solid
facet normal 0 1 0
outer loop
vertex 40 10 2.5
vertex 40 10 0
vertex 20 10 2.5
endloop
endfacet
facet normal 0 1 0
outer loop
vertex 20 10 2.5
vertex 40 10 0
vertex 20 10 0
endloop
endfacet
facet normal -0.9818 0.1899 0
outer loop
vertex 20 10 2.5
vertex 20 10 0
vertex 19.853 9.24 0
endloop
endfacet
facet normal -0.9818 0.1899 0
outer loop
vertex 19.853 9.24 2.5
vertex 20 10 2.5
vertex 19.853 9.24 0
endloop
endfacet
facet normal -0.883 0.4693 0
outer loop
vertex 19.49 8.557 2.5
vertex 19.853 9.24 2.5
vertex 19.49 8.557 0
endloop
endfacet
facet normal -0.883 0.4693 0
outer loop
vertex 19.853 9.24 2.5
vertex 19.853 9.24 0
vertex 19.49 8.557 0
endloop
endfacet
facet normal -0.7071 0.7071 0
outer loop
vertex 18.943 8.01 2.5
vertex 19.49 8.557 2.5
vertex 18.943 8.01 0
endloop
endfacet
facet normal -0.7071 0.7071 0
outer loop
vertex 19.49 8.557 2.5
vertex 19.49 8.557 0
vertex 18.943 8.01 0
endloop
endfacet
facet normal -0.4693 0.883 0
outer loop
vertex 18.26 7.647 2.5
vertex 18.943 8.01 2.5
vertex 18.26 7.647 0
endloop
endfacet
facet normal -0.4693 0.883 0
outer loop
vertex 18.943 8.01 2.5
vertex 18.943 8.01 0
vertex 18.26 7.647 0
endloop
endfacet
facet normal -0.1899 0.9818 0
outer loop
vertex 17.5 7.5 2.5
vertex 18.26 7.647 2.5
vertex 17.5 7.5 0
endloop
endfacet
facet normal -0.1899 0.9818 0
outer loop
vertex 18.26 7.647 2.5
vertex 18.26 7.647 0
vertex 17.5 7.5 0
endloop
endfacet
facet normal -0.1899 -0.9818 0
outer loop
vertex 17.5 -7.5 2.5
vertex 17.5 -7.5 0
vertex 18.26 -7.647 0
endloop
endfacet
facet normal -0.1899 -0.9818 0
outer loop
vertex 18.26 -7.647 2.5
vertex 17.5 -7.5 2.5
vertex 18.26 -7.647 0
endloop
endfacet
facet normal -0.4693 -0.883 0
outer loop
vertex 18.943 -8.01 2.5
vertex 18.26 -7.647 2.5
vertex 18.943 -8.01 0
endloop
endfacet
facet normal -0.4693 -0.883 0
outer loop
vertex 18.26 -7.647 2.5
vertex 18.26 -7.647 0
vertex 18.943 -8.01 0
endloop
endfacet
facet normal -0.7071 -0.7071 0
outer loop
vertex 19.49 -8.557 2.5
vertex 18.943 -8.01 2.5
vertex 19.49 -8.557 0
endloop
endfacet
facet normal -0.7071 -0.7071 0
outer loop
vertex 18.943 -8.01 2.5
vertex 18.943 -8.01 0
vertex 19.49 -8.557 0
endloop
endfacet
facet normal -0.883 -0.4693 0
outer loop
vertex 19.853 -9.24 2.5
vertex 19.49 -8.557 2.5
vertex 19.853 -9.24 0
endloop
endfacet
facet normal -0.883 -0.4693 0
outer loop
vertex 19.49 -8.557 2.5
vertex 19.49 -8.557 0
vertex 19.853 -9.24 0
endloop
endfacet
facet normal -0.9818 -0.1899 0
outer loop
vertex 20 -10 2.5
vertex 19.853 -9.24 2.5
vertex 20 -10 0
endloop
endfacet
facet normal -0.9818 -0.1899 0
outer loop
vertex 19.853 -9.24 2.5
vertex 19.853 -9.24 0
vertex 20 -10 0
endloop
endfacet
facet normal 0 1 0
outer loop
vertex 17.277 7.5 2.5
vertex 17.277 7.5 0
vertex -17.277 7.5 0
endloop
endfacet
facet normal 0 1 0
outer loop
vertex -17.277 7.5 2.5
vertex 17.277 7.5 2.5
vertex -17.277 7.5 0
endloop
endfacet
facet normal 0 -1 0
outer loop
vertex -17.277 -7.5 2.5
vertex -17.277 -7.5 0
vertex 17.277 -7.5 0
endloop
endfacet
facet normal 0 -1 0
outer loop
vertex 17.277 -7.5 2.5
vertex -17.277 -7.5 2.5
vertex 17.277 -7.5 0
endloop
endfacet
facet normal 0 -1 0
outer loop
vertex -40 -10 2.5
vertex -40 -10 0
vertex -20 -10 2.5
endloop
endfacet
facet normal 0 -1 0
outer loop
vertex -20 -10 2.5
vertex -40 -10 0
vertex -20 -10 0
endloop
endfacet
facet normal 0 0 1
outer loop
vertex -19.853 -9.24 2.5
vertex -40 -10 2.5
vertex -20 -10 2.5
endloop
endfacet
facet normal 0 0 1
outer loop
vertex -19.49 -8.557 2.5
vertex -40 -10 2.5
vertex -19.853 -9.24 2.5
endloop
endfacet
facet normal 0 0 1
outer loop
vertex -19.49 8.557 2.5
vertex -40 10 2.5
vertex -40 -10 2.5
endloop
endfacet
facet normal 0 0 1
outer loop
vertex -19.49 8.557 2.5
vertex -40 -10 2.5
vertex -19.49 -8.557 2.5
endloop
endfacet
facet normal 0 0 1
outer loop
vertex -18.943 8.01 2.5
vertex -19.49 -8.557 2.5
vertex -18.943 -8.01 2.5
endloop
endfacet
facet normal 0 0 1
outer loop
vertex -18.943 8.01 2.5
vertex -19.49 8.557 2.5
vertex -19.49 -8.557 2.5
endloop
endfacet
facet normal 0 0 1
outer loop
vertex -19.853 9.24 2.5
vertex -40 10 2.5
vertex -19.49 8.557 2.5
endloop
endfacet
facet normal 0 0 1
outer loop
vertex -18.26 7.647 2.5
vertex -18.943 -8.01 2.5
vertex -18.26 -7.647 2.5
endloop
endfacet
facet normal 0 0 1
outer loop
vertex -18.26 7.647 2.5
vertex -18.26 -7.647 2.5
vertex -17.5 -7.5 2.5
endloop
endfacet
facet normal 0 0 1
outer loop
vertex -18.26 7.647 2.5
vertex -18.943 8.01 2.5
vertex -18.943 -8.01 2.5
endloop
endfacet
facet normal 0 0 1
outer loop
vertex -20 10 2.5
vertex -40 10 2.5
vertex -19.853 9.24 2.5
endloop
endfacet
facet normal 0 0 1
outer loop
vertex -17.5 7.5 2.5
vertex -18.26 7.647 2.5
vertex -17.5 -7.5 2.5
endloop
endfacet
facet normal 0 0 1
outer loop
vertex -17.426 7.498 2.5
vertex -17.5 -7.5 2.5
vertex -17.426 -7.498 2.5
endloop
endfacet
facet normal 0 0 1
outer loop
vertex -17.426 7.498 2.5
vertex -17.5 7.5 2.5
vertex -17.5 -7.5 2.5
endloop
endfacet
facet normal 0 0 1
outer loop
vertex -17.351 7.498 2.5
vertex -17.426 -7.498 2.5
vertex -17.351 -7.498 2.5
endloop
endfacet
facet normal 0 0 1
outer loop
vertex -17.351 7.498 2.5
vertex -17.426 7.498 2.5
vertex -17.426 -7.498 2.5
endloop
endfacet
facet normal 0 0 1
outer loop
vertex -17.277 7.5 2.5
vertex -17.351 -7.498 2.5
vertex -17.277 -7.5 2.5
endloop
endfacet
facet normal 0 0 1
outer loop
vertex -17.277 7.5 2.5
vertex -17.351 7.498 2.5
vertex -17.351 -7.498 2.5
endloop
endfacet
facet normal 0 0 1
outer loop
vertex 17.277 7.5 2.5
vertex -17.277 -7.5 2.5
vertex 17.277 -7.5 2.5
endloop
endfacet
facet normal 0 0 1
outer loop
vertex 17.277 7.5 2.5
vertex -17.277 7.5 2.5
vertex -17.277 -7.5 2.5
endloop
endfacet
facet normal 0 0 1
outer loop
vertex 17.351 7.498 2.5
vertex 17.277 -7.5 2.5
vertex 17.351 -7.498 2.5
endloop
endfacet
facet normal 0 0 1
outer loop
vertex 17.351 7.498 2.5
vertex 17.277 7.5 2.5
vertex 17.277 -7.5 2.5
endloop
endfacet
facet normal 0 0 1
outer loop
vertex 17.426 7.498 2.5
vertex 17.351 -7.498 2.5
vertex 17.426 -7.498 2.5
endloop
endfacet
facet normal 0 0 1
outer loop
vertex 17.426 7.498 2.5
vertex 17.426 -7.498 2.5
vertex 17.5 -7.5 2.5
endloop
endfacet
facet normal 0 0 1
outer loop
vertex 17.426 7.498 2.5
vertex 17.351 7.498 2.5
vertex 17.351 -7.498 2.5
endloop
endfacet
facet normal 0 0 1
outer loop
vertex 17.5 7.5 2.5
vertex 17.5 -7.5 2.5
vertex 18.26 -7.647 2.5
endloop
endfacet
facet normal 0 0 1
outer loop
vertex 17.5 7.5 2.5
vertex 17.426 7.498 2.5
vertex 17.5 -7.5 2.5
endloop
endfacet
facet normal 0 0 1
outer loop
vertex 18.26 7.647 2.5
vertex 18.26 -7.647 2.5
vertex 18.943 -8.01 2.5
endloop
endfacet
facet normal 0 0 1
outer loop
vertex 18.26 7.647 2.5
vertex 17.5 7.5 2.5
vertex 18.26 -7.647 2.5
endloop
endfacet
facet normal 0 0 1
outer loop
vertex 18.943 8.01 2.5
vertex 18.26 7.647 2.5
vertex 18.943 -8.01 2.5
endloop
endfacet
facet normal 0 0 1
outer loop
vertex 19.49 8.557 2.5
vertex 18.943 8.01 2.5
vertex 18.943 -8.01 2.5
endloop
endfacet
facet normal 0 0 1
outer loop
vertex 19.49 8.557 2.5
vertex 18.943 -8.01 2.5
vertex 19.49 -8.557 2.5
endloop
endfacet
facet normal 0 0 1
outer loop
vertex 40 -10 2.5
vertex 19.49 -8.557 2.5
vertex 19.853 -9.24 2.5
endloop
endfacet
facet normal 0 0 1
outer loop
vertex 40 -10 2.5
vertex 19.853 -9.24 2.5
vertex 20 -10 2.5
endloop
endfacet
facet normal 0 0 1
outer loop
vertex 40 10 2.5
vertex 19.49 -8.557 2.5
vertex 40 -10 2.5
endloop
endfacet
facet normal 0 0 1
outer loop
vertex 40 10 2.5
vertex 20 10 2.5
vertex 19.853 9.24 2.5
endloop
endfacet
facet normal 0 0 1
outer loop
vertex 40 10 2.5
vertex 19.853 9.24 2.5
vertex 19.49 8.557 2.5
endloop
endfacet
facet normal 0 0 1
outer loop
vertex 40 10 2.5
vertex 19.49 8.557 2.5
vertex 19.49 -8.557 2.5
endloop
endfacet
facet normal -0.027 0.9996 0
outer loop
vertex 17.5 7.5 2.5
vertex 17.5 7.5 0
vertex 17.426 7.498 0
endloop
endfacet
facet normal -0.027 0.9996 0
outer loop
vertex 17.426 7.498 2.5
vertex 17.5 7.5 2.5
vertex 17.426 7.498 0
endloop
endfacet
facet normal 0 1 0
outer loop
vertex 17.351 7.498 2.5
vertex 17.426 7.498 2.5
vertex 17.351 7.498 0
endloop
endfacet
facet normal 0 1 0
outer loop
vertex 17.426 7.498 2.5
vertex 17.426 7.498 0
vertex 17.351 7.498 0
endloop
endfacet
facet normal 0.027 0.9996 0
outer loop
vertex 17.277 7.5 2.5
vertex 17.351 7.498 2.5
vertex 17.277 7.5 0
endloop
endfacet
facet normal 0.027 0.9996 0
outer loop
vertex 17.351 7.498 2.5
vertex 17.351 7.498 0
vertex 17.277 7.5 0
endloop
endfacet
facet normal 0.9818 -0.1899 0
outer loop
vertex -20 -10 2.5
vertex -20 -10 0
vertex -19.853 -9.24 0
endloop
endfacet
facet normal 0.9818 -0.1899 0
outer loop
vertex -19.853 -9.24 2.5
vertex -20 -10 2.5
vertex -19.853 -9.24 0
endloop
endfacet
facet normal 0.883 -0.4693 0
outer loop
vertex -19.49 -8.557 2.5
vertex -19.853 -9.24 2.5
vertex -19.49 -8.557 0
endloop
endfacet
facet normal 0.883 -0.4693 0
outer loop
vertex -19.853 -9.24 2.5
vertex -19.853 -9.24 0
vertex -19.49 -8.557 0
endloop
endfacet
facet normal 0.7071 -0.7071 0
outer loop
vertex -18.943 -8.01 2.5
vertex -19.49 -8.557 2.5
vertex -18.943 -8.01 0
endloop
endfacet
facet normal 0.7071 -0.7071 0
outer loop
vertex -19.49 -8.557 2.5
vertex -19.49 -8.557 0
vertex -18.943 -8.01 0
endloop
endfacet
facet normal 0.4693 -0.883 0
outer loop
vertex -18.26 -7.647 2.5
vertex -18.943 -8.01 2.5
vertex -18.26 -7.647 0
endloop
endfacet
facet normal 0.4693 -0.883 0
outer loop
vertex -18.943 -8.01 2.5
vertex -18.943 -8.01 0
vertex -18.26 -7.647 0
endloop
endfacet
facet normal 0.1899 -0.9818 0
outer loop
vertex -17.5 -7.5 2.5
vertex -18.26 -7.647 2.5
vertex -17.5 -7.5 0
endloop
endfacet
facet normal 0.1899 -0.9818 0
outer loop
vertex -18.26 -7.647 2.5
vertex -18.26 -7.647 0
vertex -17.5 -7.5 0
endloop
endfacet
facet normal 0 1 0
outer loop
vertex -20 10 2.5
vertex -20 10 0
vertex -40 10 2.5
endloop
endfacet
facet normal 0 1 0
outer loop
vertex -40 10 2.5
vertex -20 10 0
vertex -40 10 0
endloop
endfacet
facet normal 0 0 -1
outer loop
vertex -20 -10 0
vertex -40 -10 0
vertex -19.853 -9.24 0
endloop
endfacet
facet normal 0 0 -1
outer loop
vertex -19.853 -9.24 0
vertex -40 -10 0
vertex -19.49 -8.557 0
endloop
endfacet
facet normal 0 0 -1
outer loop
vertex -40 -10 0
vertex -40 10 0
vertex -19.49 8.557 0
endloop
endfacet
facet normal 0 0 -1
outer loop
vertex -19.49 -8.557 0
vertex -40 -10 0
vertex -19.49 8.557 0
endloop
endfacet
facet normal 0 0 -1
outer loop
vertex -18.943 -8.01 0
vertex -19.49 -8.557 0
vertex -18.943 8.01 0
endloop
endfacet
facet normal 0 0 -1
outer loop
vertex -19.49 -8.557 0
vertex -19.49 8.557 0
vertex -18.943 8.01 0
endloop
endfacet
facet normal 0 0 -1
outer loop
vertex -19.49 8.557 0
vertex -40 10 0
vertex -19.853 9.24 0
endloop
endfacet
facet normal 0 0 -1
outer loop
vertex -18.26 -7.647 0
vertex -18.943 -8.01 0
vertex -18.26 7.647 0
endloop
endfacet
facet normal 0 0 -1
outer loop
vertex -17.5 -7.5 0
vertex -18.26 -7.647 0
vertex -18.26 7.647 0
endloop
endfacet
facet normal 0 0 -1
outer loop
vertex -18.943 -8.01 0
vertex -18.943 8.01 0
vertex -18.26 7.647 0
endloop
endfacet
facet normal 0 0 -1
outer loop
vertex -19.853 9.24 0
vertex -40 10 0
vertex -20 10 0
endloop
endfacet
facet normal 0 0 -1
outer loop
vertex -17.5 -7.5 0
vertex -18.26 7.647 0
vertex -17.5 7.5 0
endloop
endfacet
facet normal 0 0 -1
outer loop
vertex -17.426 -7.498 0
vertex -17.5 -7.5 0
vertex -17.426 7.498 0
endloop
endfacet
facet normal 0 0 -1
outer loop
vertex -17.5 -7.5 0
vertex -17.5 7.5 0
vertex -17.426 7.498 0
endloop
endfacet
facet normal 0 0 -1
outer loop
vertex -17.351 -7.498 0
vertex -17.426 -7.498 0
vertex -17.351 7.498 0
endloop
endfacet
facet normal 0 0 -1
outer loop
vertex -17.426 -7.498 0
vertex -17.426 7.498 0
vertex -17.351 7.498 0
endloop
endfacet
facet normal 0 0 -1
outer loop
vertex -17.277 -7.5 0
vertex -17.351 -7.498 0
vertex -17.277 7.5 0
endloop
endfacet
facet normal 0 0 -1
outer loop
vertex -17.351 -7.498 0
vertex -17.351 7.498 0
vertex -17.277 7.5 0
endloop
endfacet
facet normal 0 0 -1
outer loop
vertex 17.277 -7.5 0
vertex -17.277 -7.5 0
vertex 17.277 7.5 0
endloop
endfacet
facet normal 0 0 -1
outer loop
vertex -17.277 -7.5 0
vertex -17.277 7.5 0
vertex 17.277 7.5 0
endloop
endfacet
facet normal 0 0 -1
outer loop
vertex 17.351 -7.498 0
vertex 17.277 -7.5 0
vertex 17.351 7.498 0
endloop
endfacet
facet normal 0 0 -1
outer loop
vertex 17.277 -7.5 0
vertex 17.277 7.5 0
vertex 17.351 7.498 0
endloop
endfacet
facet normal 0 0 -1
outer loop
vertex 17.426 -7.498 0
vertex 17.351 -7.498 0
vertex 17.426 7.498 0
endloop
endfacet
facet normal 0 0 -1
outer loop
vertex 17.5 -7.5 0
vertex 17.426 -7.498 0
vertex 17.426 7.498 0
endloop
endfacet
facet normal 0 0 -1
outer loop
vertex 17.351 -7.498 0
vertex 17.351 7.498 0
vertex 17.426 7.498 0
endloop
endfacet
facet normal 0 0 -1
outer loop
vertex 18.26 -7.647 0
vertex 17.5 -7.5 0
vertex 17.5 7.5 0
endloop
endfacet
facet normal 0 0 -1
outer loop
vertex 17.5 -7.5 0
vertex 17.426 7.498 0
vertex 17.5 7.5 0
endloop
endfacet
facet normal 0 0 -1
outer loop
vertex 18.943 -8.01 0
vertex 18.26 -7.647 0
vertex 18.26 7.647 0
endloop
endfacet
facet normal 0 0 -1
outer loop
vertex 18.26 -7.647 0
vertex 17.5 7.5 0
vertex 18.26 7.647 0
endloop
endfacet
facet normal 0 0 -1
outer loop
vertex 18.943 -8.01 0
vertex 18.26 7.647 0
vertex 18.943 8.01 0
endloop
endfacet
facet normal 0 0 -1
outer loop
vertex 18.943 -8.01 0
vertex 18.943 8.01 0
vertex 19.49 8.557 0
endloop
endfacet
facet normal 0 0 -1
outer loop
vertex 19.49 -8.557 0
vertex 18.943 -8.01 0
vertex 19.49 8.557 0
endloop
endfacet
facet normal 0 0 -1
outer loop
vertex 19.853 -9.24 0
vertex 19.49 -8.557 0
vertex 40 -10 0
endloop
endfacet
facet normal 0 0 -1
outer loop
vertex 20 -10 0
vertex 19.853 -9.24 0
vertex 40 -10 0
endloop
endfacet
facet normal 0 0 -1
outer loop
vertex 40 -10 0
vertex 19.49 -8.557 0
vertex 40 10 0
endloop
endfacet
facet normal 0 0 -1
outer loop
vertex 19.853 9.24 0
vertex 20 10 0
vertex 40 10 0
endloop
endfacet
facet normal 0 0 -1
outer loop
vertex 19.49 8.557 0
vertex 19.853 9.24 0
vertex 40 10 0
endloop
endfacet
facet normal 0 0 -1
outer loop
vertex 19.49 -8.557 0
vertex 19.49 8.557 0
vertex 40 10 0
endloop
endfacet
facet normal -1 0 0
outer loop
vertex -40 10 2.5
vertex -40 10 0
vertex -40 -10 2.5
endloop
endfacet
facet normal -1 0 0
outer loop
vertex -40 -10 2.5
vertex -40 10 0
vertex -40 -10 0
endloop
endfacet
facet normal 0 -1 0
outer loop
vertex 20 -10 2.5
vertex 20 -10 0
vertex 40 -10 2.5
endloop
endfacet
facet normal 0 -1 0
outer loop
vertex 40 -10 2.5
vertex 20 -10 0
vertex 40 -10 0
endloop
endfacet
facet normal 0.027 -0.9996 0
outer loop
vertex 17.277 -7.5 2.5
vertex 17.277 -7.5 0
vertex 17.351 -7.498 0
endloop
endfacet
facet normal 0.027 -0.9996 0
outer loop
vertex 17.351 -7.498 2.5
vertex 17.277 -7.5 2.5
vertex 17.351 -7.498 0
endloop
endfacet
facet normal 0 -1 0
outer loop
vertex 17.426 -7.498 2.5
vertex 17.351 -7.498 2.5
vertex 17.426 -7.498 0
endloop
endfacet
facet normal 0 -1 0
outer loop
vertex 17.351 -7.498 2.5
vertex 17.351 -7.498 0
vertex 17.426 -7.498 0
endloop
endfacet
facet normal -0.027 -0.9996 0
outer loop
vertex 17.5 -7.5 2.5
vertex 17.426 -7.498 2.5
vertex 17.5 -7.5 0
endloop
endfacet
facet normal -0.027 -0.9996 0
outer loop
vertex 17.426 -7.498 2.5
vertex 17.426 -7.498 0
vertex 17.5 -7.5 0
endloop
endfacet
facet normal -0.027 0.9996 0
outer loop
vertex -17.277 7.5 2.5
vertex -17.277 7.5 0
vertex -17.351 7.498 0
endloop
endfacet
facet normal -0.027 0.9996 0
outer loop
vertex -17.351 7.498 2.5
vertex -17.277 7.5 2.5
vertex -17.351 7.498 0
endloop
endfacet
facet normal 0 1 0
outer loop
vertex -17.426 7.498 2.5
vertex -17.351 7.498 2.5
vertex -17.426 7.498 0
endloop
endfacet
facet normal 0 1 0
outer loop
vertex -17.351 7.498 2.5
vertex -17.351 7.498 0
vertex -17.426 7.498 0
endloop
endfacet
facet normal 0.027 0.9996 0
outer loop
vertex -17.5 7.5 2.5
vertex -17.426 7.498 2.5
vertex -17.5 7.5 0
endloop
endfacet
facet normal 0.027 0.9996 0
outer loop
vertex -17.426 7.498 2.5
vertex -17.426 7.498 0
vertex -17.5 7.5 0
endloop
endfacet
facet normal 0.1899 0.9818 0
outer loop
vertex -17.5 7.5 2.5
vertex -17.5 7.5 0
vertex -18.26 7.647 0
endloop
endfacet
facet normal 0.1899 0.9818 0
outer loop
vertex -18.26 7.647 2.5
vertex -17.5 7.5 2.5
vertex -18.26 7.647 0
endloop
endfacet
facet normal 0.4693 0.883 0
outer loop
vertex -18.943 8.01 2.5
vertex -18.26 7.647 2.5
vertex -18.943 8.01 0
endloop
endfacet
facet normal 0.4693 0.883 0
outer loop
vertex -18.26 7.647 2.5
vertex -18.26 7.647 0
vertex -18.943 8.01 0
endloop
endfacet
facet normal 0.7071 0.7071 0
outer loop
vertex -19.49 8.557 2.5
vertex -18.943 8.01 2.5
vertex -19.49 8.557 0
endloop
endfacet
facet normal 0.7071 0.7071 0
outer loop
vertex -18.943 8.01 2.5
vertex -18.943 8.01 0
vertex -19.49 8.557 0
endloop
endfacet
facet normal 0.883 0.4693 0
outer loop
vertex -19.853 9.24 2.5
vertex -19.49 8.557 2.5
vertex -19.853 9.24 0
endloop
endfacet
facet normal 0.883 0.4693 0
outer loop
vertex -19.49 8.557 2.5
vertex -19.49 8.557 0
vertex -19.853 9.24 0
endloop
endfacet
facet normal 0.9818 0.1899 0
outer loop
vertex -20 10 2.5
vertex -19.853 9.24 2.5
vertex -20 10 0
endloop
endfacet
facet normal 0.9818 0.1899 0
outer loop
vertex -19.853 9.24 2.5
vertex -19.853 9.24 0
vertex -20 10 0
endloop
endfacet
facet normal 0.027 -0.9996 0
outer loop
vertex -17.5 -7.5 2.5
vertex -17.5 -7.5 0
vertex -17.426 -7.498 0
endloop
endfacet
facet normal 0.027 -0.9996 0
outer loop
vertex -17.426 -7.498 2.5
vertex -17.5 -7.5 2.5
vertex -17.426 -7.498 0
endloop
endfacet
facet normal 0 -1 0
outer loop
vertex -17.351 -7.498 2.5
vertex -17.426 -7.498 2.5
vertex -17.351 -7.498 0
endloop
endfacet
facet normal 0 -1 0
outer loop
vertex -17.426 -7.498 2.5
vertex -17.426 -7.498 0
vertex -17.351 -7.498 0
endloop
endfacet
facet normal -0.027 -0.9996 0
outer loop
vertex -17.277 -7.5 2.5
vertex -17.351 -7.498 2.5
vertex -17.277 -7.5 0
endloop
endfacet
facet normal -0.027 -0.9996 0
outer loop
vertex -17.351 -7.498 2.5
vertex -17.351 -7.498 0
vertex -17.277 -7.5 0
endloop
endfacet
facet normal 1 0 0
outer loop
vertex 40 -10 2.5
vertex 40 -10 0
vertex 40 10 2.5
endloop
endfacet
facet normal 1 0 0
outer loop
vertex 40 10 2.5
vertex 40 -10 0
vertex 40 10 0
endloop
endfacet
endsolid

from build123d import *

# Parameters (mm, degrees)
F1_DEPTH = 2.5


with BuildPart() as f1:
    # F0 (on Top) → F1 (new body)
    with BuildSketch(Plane.XY):
        with BuildLine():
            Line((40, -10), (40, 10))
            Line((40, 10), (20, 10))
            ThreePointArc((20, 10), (19.23682, 8.26318), (17.5, 7.5))
            ThreePointArc((17.5, 7.5), (17.388608, 7.497625), (17.277216, 7.5))
            Line((17.277216, 7.5), (-17.277216, 7.5))
            ThreePointArc((-17.277216, 7.5), (-17.388608, 7.497625), (-17.5, 7.5))
            ThreePointArc((-17.5, 7.5), (-19.23682, 8.26318), (-20, 10))
            Line((-20, 10), (-40, 10))
            Line((-40, 10), (-40, -10))
            Line((-40, -10), (-20, -10))
            ThreePointArc((-20, -10), (-19.23682, -8.26318), (-17.5, -7.5))
            ThreePointArc((-17.5, -7.5), (-17.388608, -7.497625), (-17.277216, -7.5))
            Line((-17.277216, -7.5), (17.277216, -7.5))
            ThreePointArc((17.277216, -7.5), (17.388608, -7.497625), (17.5, -7.5))
            ThreePointArc((17.5, -7.5), (19.23682, -8.26318), (20, -10))
            Line((20, -10), (40, -10))
        make_face()
    extrude(amount=F1_DEPTH)


solid = f1.part
